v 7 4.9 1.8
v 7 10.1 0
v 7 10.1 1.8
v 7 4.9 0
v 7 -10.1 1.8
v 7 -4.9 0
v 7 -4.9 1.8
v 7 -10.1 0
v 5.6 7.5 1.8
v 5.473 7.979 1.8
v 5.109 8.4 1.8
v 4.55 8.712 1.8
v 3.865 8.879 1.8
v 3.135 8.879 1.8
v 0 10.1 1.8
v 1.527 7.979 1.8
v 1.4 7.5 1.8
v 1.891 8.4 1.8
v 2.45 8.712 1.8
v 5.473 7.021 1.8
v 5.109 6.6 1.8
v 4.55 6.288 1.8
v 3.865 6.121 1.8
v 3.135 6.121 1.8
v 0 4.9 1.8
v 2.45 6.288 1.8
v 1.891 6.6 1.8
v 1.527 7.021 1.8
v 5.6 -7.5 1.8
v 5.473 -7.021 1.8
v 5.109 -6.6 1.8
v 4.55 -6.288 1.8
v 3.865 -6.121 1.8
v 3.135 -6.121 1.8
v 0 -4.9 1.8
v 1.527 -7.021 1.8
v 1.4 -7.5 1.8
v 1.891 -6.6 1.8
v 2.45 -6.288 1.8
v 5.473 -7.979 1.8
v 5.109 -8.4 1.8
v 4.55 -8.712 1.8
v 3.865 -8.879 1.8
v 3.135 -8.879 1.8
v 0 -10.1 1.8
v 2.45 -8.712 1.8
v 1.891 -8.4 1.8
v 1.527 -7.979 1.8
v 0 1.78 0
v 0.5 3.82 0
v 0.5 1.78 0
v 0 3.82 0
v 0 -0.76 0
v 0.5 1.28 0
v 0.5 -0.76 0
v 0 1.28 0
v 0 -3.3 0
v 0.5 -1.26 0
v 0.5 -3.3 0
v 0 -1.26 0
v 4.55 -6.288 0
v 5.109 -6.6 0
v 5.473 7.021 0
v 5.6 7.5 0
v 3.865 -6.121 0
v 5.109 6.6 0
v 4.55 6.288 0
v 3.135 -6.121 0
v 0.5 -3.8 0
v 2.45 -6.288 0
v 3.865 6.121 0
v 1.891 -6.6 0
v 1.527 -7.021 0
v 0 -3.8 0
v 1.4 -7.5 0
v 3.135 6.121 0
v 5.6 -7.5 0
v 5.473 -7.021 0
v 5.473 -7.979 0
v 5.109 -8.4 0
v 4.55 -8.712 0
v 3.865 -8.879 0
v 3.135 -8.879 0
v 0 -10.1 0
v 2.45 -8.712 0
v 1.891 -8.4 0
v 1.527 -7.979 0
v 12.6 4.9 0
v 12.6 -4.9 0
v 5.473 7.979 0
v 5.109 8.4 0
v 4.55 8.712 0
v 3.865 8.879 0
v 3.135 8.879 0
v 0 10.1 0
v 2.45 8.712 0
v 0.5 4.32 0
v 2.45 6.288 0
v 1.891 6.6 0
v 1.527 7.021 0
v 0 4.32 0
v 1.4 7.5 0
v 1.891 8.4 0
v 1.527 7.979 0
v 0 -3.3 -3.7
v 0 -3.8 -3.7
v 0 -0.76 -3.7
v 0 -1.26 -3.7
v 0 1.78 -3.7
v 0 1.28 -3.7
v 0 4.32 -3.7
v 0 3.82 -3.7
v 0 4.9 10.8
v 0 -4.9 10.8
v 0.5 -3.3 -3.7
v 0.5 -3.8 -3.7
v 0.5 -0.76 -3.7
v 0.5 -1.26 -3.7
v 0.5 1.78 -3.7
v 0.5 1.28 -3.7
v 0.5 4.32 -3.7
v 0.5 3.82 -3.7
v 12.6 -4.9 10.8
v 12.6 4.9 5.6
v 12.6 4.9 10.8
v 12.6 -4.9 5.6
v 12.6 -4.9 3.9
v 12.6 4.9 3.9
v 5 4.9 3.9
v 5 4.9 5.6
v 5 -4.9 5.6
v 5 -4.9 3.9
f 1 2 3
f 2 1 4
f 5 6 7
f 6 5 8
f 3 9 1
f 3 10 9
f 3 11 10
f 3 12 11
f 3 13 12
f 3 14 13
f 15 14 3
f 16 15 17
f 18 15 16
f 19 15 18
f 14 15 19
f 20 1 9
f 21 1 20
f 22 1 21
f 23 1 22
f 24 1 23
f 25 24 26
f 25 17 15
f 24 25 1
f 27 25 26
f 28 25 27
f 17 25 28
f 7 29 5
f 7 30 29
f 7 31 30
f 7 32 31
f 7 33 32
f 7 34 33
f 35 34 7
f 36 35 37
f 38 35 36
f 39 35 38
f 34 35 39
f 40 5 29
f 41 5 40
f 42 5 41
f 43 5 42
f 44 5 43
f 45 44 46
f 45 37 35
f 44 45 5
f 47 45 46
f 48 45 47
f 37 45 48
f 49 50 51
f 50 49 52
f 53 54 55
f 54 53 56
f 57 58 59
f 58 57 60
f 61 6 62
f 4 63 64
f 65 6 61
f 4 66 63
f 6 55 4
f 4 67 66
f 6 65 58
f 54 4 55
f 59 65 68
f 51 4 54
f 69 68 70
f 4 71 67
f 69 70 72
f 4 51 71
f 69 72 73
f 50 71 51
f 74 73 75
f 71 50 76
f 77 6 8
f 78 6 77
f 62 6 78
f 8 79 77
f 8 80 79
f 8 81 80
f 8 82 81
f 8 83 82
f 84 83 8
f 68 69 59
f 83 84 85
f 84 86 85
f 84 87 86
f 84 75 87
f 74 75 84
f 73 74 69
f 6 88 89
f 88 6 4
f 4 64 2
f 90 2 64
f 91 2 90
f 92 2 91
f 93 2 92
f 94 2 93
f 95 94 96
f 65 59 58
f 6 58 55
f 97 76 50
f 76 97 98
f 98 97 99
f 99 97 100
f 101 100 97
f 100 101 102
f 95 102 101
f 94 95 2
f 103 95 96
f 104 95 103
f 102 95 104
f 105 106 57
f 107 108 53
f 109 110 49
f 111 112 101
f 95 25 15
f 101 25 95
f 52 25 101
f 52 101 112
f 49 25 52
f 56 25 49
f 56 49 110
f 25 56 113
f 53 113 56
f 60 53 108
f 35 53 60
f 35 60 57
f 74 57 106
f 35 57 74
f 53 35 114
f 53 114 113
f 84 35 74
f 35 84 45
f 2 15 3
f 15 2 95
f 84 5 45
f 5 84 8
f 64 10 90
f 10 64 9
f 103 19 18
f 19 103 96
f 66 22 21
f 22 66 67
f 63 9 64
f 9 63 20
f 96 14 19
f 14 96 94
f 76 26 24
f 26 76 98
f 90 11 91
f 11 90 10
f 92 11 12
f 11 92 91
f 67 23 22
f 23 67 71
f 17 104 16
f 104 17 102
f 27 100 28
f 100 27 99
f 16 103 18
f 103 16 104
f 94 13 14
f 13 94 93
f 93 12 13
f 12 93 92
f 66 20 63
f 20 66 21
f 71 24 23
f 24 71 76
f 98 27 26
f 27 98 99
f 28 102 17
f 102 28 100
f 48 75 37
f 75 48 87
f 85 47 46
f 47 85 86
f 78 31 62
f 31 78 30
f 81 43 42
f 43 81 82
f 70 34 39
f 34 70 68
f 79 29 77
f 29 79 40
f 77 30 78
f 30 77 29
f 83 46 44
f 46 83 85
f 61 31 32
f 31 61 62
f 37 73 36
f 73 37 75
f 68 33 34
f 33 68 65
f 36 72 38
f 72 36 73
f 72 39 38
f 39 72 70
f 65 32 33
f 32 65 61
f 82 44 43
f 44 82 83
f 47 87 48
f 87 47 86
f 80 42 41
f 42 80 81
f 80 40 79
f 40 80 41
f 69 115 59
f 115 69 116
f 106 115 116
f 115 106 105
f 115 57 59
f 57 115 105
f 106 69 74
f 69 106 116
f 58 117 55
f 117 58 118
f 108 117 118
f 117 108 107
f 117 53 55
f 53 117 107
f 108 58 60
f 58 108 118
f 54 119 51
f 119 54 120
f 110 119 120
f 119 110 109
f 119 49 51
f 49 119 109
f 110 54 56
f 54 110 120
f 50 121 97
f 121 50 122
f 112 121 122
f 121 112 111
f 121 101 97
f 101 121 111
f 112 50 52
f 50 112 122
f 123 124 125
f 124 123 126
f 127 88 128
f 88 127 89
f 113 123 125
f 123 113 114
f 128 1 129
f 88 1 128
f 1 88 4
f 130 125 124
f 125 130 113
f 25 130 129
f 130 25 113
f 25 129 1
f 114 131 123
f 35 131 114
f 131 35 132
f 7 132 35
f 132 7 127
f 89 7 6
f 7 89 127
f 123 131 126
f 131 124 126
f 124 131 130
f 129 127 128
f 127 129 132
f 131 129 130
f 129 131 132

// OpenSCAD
pitch = 2.54;

//bottom mounting bracket
bottom = [7,20.2,1.8];
b_pos = [0,-10.1,0];
m_hol = [1.4*3/2,1.4,3.8];
m_cyl = [0.5,0.5,1];
m_pos = [3.5,7.5,-1 ];
m_pos2 = [3.5,-7.5,-1];

//bottom bracket
difference(){
translate(b_pos)cube(bottom);

translate(m_pos)
    scale(m_hol)cylinder(m_cyl,true, $fn=18);
translate(m_pos2)
   scale(m_hol)cylinder(m_cyl,true, $fn=18);
}
//pins
pitch = 2.54;
pin = [0.5,0.5,5.5];
offset = [0,-3.8,-(5.5-1.8)];

for(i=[0:3]){
translate(offset+[0,i*pitch,0])
    color("silver",1)
    cube(pin);
}

//body
bl = [12.6,9.8,10.8];
bl_pos = [0,-9.8/2,0];

bu = [10,10,1.7];
bu_pos = [2.8+6.4-4.2,-5,3.9];

difference(){
translate(bl_pos)cube(bl);
translate(bu_pos)cube(bu);
}
